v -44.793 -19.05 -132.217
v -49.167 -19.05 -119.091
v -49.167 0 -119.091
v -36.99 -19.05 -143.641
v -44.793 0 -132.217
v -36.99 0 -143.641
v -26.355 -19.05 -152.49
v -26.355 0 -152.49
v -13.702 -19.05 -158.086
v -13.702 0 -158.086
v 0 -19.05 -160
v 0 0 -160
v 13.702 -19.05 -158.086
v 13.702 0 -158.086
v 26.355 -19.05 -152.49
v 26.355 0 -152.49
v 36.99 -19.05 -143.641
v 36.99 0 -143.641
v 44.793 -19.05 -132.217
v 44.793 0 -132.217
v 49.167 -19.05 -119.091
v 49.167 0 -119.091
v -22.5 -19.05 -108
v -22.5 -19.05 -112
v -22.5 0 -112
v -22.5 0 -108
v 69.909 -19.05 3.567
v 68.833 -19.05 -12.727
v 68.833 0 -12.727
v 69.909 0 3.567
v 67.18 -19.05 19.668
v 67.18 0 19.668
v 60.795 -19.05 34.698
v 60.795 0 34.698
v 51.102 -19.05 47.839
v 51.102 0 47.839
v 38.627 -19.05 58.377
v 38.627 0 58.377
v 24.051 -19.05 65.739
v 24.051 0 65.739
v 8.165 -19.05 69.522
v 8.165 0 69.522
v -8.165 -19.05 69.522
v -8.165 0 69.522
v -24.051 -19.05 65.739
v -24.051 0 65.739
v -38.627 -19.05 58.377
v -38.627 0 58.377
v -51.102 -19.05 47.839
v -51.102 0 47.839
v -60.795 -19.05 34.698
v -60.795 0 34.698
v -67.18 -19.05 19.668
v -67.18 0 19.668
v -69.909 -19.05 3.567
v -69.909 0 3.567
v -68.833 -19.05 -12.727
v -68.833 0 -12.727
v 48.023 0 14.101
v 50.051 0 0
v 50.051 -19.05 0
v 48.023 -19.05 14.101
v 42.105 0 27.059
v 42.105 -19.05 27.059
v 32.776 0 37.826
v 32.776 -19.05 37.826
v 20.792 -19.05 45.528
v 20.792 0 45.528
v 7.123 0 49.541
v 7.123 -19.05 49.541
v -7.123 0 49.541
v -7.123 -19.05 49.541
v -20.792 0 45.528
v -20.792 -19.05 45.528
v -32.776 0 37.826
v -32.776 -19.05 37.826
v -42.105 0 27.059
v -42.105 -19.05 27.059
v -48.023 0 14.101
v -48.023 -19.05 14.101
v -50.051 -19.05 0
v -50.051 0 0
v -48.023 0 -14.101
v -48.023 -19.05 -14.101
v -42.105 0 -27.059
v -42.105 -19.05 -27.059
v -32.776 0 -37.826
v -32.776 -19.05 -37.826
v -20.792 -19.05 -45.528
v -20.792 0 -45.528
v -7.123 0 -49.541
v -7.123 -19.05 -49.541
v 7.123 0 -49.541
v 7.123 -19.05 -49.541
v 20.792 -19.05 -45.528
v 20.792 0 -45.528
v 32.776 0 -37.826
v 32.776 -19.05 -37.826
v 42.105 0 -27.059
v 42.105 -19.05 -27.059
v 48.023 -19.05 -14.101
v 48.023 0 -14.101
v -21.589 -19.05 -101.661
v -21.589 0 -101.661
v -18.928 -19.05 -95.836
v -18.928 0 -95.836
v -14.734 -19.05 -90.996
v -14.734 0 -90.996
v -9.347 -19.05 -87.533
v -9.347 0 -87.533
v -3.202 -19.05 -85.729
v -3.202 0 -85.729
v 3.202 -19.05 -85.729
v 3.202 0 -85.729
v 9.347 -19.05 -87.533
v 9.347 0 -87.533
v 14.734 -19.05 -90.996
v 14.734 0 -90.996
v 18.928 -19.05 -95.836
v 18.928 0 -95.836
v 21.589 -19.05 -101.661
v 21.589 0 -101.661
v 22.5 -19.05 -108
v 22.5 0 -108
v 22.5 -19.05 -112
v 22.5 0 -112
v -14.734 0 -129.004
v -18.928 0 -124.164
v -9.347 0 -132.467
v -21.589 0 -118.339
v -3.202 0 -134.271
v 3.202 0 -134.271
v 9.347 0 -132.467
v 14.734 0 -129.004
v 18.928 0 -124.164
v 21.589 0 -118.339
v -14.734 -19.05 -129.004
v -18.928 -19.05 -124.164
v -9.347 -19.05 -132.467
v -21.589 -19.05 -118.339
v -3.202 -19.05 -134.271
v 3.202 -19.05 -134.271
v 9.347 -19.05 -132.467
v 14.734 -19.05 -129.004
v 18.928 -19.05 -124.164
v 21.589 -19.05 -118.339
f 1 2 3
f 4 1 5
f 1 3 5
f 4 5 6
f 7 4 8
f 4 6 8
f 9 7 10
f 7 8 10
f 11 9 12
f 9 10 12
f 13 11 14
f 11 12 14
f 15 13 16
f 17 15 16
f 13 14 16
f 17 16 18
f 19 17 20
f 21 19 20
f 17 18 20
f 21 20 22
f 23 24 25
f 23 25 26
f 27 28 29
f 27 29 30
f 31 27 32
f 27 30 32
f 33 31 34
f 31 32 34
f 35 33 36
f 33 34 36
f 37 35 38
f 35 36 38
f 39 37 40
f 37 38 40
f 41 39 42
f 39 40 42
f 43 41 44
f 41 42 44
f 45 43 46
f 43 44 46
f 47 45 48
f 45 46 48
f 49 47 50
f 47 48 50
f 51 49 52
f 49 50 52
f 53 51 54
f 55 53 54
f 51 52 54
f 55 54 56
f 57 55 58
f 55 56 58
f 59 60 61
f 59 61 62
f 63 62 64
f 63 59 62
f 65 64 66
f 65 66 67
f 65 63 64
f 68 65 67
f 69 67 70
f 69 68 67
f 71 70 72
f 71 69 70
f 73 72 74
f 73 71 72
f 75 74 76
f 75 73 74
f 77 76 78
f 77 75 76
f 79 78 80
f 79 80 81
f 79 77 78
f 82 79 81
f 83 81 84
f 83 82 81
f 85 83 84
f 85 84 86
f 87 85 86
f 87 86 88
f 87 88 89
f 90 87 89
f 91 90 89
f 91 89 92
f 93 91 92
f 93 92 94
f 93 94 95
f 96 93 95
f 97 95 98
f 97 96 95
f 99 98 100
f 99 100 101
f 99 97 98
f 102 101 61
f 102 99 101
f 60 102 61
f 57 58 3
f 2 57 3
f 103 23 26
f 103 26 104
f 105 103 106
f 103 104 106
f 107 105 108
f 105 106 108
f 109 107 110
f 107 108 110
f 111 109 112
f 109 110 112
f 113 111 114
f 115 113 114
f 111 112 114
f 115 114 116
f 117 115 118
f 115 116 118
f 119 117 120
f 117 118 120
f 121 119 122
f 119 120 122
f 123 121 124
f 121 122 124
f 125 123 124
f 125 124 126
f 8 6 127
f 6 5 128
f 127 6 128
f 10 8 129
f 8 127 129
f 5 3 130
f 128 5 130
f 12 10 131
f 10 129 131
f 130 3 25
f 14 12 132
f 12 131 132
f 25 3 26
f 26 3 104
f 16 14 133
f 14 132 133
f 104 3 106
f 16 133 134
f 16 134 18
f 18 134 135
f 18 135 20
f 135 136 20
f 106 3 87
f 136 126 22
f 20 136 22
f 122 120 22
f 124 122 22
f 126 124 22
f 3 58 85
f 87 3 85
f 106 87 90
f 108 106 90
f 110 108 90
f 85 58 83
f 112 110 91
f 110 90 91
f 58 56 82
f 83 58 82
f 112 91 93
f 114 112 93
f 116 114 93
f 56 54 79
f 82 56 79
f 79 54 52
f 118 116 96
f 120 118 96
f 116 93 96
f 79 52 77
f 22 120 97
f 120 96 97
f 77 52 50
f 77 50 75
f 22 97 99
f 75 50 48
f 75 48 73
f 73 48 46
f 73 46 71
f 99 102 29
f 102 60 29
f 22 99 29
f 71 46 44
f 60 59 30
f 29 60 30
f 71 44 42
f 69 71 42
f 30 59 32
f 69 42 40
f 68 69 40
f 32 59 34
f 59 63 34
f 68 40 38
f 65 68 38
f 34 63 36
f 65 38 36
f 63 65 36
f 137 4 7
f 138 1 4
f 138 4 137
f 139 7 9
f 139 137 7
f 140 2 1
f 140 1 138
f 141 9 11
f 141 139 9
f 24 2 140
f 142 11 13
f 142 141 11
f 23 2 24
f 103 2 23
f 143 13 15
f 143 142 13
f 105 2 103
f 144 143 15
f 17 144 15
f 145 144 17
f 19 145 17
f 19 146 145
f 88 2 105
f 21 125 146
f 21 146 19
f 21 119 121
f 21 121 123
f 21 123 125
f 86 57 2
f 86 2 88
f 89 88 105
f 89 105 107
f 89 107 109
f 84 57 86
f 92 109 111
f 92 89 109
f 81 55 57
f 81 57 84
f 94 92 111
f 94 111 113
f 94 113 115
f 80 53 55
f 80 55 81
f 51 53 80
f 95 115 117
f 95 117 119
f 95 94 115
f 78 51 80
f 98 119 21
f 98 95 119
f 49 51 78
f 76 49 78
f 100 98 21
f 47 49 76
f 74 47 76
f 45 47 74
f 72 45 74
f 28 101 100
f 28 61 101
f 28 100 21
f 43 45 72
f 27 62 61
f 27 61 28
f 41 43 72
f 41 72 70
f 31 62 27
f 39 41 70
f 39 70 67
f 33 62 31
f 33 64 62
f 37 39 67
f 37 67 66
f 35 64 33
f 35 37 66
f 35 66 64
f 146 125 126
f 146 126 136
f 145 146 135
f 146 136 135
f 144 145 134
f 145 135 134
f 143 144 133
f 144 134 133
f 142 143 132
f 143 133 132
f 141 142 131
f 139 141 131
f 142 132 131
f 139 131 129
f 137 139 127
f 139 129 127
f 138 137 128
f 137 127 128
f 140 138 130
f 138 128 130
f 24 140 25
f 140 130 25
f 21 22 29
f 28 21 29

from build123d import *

# Parameters (mm, degrees)
F0_R     = 50.0507
F1_DEPTH = 19.05


with BuildPart() as f1:
    # F0 (on Front) → F1 (new body)
    with BuildSketch(Plane.XZ):
        with BuildLine():
            Line((49.1666083018, -119.0909090909), (68.8332516225, -12.7272727273))
            ThreePointArc((68.8332516225, -12.7272727273), (0, 70), (-68.8332516225, -12.7272727273))
            Line((-68.8332516225, -12.7272727273), (-49.1666083018, -119.0909090909))
            ThreePointArc((-49.1666083018, -119.0909090909), (0, -160), (49.1666083018, -119.0909090909))
        make_face()
        with BuildLine():
            Line((-22.5, -112), (-22.5, -108))
            ThreePointArc((-22.5, -108), (0, -85.5), (22.5, -108))
            Line((22.5, -108), (22.5, -112))
            ThreePointArc((22.5, -112), (0, -134.5), (-22.5, -112))
        make_face(mode=Mode.SUBTRACT)
        Circle(F0_R, mode=Mode.SUBTRACT)
    extrude(amount=F1_DEPTH)


solid = f1.part
